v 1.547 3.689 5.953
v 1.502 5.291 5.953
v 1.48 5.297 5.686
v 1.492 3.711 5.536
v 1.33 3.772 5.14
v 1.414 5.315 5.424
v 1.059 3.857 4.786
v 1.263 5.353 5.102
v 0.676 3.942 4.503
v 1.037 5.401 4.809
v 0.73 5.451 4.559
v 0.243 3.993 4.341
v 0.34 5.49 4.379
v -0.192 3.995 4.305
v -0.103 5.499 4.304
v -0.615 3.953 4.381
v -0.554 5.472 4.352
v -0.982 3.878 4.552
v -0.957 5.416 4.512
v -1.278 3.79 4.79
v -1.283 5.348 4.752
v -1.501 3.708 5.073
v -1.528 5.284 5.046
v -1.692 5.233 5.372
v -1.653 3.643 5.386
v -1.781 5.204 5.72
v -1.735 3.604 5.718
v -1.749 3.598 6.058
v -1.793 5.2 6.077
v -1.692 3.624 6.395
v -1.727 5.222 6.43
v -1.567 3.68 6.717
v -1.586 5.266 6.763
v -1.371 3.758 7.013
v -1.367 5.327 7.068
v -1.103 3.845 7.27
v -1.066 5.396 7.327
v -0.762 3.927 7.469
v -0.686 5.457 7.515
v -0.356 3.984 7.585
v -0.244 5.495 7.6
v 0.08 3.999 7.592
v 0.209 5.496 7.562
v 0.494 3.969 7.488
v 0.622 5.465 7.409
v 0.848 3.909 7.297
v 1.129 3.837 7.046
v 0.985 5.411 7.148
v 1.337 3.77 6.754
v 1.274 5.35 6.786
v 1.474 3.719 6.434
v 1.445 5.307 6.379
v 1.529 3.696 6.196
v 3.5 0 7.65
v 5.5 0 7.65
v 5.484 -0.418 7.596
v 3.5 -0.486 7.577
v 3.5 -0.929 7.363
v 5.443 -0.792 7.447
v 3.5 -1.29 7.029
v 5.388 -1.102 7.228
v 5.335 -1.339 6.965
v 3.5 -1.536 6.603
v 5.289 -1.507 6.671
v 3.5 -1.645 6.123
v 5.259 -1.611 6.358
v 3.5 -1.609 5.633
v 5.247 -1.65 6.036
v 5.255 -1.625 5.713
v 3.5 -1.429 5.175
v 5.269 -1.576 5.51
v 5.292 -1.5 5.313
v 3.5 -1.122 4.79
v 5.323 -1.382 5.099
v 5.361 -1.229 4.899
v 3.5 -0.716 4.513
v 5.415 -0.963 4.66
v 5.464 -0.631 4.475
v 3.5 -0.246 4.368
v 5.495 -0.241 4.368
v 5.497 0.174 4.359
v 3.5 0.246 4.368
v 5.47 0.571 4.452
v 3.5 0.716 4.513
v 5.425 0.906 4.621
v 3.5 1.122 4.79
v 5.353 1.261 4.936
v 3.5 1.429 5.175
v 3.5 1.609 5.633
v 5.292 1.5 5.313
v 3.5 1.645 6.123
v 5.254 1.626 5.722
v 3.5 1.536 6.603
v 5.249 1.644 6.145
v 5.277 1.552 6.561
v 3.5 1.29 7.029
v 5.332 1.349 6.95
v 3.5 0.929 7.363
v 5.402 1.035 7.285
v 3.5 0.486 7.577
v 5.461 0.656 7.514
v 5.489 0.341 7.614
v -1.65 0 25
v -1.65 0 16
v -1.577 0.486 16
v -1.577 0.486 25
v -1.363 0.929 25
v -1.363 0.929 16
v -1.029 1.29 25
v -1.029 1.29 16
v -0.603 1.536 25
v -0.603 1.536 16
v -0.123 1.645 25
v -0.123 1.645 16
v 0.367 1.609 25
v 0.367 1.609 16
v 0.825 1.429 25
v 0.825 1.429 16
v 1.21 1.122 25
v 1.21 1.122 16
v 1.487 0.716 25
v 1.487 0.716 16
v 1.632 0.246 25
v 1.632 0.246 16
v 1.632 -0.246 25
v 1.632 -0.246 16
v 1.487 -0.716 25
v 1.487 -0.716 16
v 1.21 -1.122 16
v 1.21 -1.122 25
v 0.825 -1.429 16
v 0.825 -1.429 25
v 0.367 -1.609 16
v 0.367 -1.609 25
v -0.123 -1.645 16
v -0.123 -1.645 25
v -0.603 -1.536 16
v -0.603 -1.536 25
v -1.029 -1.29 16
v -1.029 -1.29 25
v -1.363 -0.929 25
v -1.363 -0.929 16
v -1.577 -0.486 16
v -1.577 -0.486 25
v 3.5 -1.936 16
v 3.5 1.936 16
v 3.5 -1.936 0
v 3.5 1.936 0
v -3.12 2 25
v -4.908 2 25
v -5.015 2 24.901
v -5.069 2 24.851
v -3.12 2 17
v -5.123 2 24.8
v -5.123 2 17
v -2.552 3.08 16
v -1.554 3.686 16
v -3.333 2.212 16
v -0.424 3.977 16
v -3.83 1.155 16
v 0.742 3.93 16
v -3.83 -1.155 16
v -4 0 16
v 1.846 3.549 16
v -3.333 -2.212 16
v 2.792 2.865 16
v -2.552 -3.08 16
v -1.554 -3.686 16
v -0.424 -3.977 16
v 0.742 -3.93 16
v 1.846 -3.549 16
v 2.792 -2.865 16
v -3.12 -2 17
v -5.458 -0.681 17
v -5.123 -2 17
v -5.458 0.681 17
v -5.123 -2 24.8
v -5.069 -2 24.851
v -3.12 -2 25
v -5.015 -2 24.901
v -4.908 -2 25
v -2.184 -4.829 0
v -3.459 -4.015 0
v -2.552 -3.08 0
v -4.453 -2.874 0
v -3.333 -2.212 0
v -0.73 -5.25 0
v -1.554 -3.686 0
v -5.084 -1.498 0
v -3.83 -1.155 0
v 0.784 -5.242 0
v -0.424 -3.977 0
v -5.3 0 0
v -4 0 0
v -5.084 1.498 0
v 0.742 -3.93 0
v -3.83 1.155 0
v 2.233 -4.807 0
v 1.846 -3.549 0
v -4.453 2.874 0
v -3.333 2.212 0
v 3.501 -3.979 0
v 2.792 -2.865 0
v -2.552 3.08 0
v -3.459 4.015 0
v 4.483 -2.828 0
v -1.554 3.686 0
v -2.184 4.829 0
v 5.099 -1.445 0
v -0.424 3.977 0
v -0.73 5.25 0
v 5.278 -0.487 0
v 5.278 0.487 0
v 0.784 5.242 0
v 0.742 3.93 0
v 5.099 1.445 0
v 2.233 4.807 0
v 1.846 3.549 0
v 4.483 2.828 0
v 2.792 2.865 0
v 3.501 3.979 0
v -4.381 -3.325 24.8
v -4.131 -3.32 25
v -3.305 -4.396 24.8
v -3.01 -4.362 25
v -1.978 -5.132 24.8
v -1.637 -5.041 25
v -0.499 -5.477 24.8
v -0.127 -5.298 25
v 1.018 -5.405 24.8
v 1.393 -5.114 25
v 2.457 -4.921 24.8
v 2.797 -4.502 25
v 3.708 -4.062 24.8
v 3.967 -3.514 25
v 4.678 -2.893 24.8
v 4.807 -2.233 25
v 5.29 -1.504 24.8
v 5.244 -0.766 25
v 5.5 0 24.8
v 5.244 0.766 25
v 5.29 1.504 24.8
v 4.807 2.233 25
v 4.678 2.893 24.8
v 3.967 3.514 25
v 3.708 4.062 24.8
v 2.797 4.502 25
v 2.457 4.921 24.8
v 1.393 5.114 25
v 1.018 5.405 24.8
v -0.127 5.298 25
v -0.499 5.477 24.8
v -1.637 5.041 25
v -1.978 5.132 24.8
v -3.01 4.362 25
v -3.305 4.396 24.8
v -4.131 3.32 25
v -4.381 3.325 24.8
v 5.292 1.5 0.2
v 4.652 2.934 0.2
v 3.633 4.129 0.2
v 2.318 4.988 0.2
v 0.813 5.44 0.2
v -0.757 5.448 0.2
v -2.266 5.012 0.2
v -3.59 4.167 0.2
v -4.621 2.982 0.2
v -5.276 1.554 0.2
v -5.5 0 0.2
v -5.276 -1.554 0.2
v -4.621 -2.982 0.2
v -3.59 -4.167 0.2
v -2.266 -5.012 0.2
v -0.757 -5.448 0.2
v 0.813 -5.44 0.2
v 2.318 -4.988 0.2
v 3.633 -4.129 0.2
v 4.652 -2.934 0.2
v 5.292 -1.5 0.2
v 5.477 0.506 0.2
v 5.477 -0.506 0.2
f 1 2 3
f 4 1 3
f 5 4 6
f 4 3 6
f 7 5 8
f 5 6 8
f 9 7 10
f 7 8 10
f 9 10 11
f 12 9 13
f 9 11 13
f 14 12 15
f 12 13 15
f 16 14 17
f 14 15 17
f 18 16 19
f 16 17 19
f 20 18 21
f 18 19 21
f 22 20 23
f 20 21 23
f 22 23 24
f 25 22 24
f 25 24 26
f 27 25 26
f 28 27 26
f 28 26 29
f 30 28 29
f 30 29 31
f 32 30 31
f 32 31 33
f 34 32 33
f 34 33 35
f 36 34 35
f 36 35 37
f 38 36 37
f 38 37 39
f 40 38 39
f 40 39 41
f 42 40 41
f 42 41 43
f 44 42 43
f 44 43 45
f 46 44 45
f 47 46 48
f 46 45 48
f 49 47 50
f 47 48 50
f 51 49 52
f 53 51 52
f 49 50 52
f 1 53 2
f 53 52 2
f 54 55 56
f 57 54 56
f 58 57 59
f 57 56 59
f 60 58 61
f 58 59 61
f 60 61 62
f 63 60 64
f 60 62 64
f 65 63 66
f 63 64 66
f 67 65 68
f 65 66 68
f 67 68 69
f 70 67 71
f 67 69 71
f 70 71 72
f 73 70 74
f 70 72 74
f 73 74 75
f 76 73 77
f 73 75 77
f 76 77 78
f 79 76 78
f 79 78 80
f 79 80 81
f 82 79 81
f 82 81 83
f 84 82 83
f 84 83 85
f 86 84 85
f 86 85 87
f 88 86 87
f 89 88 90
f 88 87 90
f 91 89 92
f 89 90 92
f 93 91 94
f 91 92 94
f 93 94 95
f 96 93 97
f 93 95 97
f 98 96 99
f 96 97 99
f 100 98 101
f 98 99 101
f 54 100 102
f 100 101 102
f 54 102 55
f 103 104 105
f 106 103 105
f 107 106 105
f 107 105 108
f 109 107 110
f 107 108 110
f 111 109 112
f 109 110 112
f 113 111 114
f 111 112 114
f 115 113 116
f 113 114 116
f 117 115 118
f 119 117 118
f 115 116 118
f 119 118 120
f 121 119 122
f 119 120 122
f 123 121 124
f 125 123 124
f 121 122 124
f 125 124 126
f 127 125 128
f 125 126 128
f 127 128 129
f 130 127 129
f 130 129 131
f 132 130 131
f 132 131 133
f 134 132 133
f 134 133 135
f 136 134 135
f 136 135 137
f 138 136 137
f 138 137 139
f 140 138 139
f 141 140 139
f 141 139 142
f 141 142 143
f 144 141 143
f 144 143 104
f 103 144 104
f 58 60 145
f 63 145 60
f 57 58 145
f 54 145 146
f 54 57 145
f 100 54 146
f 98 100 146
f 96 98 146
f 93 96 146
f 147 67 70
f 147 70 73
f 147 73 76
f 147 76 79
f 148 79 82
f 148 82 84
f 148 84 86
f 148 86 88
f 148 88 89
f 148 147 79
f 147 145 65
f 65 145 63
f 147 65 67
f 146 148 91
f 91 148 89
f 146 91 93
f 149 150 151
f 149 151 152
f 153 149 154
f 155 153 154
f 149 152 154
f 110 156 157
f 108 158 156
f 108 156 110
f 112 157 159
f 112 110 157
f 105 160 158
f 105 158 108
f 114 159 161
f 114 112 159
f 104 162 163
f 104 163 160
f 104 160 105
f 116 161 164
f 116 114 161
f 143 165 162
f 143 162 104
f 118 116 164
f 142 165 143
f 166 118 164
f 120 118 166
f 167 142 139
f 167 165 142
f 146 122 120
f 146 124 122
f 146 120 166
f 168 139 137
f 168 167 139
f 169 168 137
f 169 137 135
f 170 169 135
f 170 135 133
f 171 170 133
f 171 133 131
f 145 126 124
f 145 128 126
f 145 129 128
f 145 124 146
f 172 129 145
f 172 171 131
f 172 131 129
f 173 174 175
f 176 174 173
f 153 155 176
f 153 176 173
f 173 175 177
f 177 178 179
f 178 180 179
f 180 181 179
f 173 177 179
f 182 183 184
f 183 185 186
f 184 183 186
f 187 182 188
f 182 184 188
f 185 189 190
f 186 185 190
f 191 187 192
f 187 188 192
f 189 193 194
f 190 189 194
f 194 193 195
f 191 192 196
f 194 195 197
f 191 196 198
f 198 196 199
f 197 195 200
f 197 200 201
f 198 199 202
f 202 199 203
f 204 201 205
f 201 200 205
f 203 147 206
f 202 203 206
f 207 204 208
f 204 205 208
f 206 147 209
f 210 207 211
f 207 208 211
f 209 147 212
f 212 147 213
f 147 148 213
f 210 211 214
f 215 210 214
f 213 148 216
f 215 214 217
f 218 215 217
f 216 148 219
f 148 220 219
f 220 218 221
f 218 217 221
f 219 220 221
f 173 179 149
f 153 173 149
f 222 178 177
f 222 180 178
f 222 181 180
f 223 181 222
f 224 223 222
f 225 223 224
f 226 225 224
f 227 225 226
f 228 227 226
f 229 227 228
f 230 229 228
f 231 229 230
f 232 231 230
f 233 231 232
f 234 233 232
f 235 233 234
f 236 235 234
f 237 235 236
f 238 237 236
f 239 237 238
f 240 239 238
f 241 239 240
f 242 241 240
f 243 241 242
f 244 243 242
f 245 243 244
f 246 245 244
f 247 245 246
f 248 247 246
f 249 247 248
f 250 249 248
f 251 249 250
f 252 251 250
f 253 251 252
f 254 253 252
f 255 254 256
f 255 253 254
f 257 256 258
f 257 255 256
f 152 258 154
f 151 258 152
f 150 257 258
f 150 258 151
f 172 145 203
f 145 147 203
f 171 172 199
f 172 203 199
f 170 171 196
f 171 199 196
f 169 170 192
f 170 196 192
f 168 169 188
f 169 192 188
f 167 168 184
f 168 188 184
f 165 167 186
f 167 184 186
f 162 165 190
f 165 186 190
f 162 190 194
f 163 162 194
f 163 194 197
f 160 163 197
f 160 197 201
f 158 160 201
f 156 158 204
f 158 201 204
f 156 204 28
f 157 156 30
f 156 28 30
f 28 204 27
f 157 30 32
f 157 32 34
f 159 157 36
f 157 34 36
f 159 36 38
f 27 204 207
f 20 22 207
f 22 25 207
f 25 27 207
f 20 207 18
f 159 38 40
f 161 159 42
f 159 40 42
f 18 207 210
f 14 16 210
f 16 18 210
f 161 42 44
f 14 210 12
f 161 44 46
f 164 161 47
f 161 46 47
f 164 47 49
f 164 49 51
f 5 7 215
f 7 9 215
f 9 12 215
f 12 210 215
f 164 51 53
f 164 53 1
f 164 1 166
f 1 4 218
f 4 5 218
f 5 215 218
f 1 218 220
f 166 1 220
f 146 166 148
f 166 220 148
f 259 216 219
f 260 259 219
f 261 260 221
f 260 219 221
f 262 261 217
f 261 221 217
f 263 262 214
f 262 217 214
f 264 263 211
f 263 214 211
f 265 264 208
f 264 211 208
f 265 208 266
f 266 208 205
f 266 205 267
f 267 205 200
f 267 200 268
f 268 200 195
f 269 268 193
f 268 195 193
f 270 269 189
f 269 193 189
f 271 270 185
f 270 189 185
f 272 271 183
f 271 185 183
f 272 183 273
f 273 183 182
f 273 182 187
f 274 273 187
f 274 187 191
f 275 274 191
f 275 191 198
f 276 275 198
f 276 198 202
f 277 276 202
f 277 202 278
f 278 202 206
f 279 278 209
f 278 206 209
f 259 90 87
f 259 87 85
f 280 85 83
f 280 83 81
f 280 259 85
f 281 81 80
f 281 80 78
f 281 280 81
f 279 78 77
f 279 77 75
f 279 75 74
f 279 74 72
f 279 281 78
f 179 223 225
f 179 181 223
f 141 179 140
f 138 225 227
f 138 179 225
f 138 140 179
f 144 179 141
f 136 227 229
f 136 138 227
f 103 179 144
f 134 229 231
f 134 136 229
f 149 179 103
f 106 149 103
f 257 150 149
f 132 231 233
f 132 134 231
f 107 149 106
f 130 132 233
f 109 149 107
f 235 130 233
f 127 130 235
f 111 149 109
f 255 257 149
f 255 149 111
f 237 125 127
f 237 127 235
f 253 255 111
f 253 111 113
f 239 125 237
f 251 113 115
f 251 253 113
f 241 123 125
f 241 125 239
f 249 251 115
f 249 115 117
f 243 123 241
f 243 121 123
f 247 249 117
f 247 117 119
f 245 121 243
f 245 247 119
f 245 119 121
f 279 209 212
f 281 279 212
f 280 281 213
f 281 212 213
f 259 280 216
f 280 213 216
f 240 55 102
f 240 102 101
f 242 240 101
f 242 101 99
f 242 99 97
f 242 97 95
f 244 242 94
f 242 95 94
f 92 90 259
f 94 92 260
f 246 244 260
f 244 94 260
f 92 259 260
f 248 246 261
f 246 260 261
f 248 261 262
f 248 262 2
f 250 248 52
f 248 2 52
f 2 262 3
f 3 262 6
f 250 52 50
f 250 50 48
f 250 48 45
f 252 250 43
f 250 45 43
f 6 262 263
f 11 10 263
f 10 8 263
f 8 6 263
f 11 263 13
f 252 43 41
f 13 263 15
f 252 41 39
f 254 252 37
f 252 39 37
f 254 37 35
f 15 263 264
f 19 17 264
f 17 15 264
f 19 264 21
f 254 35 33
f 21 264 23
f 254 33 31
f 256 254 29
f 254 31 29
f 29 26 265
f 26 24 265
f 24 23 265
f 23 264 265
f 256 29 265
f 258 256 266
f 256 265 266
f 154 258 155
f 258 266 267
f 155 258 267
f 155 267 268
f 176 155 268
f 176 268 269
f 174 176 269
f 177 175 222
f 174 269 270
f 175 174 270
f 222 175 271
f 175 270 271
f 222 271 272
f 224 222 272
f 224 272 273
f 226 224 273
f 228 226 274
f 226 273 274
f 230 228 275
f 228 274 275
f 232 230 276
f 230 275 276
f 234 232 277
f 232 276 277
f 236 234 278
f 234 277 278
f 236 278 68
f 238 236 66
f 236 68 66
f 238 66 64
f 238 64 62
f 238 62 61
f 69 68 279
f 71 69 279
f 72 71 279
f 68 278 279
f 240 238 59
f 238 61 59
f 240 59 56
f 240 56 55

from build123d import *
from build123d.topology import SkipClean

# Parameters (mm, degrees)
SKETCH_1_R              = 5.5
EXTRUDE_1_DEPTH         = 18
SKETCH_2_R              = 4
CUT_EXTRUDE_1_DEPTH     = 18
EXTRUDE_2_DEPTH         = 18
CUT_EXTRUDE_3_DEPTH     = 6
EXTRUDE_START           = 6
EXTRUDE_3_DEPTH         = 6
SKETCH_11_R             = 5.5
EXTRUDE_4_DEPTH         = 7
EXTRUDE_START_2         = 2
SKETCH_15_R             = 5.5
EXTRUDE_5_DEPTH         = 2
HOLE_WIZARD_M4_4_D      = 3.3
CUT_EXTRUDE_8_DEPTH     = 8
SKETCH_20_W             = 0.38
SKETCH_20_H             = 4
CUT_EXTRUDE_9_DEPTH     = 8
HOLE_WIZARD_M4_9_D      = 3.3
HOLE_WIZARD_M4_9_DEPTH  = 2
HOLE_WIZARD_M4_10_D     = 3.3
HOLE_WIZARD_M4_10_DEPTH = 1.5
CHAMFER_2_SIZE          = 0.2
CHAMFER_3_SIZE          = 0.2


with BuildPart() as part:
    # 草图1 → 凸台-拉伸1 (new body)
    with BuildSketch(Plane.XY):
        Circle(SKETCH_1_R)
    extrude(amount=EXTRUDE_1_DEPTH)

    # 草图2 → 切除-拉伸1 (cut)
    with BuildSketch(Plane(origin=(0, 0, 0), x_dir=(-1, 0, 0), z_dir=(0, 0, -1))):
        Circle(SKETCH_2_R)
    extrude(amount=-CUT_EXTRUDE_1_DEPTH, mode=Mode.SUBTRACT)

    # 草图3 → 凸台-拉伸2 (add)
    with BuildSketch(Plane(origin=(0, 0, 0), x_dir=(-1, 0, 0), z_dir=(0, 0, -1))):
        Polygon((-3.5, 0), (-3.5, 2.515567), (-4.944421, -0.303566), (-4.222211, -2.180275), (-3.5, -2.180275), align=None)
    extrude(amount=-EXTRUDE_2_DEPTH)

    # 草图5 → 切除-拉伸3 (cut)
    with BuildSketch(Plane(origin=(0, 0, 0), x_dir=(-1, 0, 0), z_dir=(0, 0, -1))):
        Polygon((-4.5, 0), (-4.5, -1.5), (-5.291503, -1.5), (-6.679987, 0.400671), (-5.291503, 1.5), (-4.5, 1.5), align=None)
    extrude(amount=-CUT_EXTRUDE_3_DEPTH, mode=Mode.SUBTRACT)

    # 草图6 → 凸台-拉伸3 (add)
    with SkipClean():  # the faces are left unmerged after this step: merging them gives an invalid solid
        with BuildSketch(Plane(origin=(0, 0, 6), x_dir=(-1, 0, 0), z_dir=(0, 0, -1)).offset(EXTRUDE_START)):
            with BuildLine():
                Line((-5.291503, -1.5), (-4.238481, -1.644386))
                Line((-4.238481, -1.644386), (-3.814049, 1.930313))
                Line((-3.814049, 1.930313), (-5.291503, 1.5))
                ThreePointArc((-5.291503, 1.5), (-5.5, 0), (-5.291503, -1.5))
            make_face()
        extrude(amount=-EXTRUDE_3_DEPTH)

    # 草图11 → 凸台-拉伸4 (add)
    with SkipClean():  # the faces are left unmerged after this step: merging them gives an invalid solid
        with BuildSketch(Plane.XY.offset(18)):
            Circle(SKETCH_11_R)
        extrude(amount=EXTRUDE_4_DEPTH)

    # 草图15 → 凸台-拉伸5 (add)
    with SkipClean():  # the faces are left unmerged after this step: merging them gives an invalid solid
        with BuildSketch(Plane(origin=(0, 0, 18), x_dir=(-1, 0, 0), z_dir=(0, 0, -1)).offset(EXTRUDE_START_2)):
            with Locations(Location((0, 0, 0), (0, 0, 180))):
                Circle(SKETCH_15_R)
        extrude(amount=-EXTRUDE_5_DEPTH)

    # M4 螺纹孔4 (through all)
    with Locations(Plane.XY.offset(25)):
        with Locations((0, 0)):
            Hole(HOLE_WIZARD_M4_4_D / 2)

    # 草图19 → 切除-拉伸8 (cut)
    with SkipClean():  # the faces are left unmerged after this step: merging them gives an invalid solid
        with BuildSketch(Plane.XY.offset(25)):
            Polygon((-5.5, 0), (-5.5, -2), (-3.5, -2), (-3.5, 2), (-5.5, 2), align=None)
        extrude(amount=-CUT_EXTRUDE_8_DEPTH, mode=Mode.SUBTRACT)

    # 草图20 → 切除-拉伸9 (cut)
    with SkipClean():  # the faces are left unmerged after this step: merging them gives an invalid solid
        with BuildSketch(Plane.XY.offset(25)):
            with Locations((-3.31, 0)):
                Rectangle(SKETCH_20_W, SKETCH_20_H)
        extrude(amount=-CUT_EXTRUDE_9_DEPTH, mode=Mode.SUBTRACT)

    # M4 螺纹孔9
    with Locations(Plane(origin=(3.5, 0, 6), x_dir=(0, 0, -1), z_dir=(-1, 0, 0))):
        with Locations((0, 0)):
            Hole(HOLE_WIZARD_M4_9_D / 2, depth=HOLE_WIZARD_M4_9_DEPTH)

    # M4 螺纹孔10
    with Locations(Plane(origin=(-0.112691, 3.998412, 5.952809), x_dir=(-0.999603066556, -0.028172847433, 0), z_dir=(0.028172847433, -0.999603066556, 0))):
        with Locations((0, 0)):
            Hole(HOLE_WIZARD_M4_10_D / 2, depth=HOLE_WIZARD_M4_10_DEPTH)

    # 倒角2
    chamfer_2_edges = [part.edges().sort_by_distance(p)[0] for p in [
        (1.017567, 5.405049, 25),
    ]]
    chamfer(chamfer_2_edges, length=CHAMFER_2_SIZE)

    # 倒角3
    chamfer_3_edges = [part.edges().sort_by_distance(p)[0] for p in [
        (-5.291503, -1.5, 0),
    ]]
    chamfer(chamfer_3_edges, length=CHAMFER_3_SIZE)


solid = part.part
